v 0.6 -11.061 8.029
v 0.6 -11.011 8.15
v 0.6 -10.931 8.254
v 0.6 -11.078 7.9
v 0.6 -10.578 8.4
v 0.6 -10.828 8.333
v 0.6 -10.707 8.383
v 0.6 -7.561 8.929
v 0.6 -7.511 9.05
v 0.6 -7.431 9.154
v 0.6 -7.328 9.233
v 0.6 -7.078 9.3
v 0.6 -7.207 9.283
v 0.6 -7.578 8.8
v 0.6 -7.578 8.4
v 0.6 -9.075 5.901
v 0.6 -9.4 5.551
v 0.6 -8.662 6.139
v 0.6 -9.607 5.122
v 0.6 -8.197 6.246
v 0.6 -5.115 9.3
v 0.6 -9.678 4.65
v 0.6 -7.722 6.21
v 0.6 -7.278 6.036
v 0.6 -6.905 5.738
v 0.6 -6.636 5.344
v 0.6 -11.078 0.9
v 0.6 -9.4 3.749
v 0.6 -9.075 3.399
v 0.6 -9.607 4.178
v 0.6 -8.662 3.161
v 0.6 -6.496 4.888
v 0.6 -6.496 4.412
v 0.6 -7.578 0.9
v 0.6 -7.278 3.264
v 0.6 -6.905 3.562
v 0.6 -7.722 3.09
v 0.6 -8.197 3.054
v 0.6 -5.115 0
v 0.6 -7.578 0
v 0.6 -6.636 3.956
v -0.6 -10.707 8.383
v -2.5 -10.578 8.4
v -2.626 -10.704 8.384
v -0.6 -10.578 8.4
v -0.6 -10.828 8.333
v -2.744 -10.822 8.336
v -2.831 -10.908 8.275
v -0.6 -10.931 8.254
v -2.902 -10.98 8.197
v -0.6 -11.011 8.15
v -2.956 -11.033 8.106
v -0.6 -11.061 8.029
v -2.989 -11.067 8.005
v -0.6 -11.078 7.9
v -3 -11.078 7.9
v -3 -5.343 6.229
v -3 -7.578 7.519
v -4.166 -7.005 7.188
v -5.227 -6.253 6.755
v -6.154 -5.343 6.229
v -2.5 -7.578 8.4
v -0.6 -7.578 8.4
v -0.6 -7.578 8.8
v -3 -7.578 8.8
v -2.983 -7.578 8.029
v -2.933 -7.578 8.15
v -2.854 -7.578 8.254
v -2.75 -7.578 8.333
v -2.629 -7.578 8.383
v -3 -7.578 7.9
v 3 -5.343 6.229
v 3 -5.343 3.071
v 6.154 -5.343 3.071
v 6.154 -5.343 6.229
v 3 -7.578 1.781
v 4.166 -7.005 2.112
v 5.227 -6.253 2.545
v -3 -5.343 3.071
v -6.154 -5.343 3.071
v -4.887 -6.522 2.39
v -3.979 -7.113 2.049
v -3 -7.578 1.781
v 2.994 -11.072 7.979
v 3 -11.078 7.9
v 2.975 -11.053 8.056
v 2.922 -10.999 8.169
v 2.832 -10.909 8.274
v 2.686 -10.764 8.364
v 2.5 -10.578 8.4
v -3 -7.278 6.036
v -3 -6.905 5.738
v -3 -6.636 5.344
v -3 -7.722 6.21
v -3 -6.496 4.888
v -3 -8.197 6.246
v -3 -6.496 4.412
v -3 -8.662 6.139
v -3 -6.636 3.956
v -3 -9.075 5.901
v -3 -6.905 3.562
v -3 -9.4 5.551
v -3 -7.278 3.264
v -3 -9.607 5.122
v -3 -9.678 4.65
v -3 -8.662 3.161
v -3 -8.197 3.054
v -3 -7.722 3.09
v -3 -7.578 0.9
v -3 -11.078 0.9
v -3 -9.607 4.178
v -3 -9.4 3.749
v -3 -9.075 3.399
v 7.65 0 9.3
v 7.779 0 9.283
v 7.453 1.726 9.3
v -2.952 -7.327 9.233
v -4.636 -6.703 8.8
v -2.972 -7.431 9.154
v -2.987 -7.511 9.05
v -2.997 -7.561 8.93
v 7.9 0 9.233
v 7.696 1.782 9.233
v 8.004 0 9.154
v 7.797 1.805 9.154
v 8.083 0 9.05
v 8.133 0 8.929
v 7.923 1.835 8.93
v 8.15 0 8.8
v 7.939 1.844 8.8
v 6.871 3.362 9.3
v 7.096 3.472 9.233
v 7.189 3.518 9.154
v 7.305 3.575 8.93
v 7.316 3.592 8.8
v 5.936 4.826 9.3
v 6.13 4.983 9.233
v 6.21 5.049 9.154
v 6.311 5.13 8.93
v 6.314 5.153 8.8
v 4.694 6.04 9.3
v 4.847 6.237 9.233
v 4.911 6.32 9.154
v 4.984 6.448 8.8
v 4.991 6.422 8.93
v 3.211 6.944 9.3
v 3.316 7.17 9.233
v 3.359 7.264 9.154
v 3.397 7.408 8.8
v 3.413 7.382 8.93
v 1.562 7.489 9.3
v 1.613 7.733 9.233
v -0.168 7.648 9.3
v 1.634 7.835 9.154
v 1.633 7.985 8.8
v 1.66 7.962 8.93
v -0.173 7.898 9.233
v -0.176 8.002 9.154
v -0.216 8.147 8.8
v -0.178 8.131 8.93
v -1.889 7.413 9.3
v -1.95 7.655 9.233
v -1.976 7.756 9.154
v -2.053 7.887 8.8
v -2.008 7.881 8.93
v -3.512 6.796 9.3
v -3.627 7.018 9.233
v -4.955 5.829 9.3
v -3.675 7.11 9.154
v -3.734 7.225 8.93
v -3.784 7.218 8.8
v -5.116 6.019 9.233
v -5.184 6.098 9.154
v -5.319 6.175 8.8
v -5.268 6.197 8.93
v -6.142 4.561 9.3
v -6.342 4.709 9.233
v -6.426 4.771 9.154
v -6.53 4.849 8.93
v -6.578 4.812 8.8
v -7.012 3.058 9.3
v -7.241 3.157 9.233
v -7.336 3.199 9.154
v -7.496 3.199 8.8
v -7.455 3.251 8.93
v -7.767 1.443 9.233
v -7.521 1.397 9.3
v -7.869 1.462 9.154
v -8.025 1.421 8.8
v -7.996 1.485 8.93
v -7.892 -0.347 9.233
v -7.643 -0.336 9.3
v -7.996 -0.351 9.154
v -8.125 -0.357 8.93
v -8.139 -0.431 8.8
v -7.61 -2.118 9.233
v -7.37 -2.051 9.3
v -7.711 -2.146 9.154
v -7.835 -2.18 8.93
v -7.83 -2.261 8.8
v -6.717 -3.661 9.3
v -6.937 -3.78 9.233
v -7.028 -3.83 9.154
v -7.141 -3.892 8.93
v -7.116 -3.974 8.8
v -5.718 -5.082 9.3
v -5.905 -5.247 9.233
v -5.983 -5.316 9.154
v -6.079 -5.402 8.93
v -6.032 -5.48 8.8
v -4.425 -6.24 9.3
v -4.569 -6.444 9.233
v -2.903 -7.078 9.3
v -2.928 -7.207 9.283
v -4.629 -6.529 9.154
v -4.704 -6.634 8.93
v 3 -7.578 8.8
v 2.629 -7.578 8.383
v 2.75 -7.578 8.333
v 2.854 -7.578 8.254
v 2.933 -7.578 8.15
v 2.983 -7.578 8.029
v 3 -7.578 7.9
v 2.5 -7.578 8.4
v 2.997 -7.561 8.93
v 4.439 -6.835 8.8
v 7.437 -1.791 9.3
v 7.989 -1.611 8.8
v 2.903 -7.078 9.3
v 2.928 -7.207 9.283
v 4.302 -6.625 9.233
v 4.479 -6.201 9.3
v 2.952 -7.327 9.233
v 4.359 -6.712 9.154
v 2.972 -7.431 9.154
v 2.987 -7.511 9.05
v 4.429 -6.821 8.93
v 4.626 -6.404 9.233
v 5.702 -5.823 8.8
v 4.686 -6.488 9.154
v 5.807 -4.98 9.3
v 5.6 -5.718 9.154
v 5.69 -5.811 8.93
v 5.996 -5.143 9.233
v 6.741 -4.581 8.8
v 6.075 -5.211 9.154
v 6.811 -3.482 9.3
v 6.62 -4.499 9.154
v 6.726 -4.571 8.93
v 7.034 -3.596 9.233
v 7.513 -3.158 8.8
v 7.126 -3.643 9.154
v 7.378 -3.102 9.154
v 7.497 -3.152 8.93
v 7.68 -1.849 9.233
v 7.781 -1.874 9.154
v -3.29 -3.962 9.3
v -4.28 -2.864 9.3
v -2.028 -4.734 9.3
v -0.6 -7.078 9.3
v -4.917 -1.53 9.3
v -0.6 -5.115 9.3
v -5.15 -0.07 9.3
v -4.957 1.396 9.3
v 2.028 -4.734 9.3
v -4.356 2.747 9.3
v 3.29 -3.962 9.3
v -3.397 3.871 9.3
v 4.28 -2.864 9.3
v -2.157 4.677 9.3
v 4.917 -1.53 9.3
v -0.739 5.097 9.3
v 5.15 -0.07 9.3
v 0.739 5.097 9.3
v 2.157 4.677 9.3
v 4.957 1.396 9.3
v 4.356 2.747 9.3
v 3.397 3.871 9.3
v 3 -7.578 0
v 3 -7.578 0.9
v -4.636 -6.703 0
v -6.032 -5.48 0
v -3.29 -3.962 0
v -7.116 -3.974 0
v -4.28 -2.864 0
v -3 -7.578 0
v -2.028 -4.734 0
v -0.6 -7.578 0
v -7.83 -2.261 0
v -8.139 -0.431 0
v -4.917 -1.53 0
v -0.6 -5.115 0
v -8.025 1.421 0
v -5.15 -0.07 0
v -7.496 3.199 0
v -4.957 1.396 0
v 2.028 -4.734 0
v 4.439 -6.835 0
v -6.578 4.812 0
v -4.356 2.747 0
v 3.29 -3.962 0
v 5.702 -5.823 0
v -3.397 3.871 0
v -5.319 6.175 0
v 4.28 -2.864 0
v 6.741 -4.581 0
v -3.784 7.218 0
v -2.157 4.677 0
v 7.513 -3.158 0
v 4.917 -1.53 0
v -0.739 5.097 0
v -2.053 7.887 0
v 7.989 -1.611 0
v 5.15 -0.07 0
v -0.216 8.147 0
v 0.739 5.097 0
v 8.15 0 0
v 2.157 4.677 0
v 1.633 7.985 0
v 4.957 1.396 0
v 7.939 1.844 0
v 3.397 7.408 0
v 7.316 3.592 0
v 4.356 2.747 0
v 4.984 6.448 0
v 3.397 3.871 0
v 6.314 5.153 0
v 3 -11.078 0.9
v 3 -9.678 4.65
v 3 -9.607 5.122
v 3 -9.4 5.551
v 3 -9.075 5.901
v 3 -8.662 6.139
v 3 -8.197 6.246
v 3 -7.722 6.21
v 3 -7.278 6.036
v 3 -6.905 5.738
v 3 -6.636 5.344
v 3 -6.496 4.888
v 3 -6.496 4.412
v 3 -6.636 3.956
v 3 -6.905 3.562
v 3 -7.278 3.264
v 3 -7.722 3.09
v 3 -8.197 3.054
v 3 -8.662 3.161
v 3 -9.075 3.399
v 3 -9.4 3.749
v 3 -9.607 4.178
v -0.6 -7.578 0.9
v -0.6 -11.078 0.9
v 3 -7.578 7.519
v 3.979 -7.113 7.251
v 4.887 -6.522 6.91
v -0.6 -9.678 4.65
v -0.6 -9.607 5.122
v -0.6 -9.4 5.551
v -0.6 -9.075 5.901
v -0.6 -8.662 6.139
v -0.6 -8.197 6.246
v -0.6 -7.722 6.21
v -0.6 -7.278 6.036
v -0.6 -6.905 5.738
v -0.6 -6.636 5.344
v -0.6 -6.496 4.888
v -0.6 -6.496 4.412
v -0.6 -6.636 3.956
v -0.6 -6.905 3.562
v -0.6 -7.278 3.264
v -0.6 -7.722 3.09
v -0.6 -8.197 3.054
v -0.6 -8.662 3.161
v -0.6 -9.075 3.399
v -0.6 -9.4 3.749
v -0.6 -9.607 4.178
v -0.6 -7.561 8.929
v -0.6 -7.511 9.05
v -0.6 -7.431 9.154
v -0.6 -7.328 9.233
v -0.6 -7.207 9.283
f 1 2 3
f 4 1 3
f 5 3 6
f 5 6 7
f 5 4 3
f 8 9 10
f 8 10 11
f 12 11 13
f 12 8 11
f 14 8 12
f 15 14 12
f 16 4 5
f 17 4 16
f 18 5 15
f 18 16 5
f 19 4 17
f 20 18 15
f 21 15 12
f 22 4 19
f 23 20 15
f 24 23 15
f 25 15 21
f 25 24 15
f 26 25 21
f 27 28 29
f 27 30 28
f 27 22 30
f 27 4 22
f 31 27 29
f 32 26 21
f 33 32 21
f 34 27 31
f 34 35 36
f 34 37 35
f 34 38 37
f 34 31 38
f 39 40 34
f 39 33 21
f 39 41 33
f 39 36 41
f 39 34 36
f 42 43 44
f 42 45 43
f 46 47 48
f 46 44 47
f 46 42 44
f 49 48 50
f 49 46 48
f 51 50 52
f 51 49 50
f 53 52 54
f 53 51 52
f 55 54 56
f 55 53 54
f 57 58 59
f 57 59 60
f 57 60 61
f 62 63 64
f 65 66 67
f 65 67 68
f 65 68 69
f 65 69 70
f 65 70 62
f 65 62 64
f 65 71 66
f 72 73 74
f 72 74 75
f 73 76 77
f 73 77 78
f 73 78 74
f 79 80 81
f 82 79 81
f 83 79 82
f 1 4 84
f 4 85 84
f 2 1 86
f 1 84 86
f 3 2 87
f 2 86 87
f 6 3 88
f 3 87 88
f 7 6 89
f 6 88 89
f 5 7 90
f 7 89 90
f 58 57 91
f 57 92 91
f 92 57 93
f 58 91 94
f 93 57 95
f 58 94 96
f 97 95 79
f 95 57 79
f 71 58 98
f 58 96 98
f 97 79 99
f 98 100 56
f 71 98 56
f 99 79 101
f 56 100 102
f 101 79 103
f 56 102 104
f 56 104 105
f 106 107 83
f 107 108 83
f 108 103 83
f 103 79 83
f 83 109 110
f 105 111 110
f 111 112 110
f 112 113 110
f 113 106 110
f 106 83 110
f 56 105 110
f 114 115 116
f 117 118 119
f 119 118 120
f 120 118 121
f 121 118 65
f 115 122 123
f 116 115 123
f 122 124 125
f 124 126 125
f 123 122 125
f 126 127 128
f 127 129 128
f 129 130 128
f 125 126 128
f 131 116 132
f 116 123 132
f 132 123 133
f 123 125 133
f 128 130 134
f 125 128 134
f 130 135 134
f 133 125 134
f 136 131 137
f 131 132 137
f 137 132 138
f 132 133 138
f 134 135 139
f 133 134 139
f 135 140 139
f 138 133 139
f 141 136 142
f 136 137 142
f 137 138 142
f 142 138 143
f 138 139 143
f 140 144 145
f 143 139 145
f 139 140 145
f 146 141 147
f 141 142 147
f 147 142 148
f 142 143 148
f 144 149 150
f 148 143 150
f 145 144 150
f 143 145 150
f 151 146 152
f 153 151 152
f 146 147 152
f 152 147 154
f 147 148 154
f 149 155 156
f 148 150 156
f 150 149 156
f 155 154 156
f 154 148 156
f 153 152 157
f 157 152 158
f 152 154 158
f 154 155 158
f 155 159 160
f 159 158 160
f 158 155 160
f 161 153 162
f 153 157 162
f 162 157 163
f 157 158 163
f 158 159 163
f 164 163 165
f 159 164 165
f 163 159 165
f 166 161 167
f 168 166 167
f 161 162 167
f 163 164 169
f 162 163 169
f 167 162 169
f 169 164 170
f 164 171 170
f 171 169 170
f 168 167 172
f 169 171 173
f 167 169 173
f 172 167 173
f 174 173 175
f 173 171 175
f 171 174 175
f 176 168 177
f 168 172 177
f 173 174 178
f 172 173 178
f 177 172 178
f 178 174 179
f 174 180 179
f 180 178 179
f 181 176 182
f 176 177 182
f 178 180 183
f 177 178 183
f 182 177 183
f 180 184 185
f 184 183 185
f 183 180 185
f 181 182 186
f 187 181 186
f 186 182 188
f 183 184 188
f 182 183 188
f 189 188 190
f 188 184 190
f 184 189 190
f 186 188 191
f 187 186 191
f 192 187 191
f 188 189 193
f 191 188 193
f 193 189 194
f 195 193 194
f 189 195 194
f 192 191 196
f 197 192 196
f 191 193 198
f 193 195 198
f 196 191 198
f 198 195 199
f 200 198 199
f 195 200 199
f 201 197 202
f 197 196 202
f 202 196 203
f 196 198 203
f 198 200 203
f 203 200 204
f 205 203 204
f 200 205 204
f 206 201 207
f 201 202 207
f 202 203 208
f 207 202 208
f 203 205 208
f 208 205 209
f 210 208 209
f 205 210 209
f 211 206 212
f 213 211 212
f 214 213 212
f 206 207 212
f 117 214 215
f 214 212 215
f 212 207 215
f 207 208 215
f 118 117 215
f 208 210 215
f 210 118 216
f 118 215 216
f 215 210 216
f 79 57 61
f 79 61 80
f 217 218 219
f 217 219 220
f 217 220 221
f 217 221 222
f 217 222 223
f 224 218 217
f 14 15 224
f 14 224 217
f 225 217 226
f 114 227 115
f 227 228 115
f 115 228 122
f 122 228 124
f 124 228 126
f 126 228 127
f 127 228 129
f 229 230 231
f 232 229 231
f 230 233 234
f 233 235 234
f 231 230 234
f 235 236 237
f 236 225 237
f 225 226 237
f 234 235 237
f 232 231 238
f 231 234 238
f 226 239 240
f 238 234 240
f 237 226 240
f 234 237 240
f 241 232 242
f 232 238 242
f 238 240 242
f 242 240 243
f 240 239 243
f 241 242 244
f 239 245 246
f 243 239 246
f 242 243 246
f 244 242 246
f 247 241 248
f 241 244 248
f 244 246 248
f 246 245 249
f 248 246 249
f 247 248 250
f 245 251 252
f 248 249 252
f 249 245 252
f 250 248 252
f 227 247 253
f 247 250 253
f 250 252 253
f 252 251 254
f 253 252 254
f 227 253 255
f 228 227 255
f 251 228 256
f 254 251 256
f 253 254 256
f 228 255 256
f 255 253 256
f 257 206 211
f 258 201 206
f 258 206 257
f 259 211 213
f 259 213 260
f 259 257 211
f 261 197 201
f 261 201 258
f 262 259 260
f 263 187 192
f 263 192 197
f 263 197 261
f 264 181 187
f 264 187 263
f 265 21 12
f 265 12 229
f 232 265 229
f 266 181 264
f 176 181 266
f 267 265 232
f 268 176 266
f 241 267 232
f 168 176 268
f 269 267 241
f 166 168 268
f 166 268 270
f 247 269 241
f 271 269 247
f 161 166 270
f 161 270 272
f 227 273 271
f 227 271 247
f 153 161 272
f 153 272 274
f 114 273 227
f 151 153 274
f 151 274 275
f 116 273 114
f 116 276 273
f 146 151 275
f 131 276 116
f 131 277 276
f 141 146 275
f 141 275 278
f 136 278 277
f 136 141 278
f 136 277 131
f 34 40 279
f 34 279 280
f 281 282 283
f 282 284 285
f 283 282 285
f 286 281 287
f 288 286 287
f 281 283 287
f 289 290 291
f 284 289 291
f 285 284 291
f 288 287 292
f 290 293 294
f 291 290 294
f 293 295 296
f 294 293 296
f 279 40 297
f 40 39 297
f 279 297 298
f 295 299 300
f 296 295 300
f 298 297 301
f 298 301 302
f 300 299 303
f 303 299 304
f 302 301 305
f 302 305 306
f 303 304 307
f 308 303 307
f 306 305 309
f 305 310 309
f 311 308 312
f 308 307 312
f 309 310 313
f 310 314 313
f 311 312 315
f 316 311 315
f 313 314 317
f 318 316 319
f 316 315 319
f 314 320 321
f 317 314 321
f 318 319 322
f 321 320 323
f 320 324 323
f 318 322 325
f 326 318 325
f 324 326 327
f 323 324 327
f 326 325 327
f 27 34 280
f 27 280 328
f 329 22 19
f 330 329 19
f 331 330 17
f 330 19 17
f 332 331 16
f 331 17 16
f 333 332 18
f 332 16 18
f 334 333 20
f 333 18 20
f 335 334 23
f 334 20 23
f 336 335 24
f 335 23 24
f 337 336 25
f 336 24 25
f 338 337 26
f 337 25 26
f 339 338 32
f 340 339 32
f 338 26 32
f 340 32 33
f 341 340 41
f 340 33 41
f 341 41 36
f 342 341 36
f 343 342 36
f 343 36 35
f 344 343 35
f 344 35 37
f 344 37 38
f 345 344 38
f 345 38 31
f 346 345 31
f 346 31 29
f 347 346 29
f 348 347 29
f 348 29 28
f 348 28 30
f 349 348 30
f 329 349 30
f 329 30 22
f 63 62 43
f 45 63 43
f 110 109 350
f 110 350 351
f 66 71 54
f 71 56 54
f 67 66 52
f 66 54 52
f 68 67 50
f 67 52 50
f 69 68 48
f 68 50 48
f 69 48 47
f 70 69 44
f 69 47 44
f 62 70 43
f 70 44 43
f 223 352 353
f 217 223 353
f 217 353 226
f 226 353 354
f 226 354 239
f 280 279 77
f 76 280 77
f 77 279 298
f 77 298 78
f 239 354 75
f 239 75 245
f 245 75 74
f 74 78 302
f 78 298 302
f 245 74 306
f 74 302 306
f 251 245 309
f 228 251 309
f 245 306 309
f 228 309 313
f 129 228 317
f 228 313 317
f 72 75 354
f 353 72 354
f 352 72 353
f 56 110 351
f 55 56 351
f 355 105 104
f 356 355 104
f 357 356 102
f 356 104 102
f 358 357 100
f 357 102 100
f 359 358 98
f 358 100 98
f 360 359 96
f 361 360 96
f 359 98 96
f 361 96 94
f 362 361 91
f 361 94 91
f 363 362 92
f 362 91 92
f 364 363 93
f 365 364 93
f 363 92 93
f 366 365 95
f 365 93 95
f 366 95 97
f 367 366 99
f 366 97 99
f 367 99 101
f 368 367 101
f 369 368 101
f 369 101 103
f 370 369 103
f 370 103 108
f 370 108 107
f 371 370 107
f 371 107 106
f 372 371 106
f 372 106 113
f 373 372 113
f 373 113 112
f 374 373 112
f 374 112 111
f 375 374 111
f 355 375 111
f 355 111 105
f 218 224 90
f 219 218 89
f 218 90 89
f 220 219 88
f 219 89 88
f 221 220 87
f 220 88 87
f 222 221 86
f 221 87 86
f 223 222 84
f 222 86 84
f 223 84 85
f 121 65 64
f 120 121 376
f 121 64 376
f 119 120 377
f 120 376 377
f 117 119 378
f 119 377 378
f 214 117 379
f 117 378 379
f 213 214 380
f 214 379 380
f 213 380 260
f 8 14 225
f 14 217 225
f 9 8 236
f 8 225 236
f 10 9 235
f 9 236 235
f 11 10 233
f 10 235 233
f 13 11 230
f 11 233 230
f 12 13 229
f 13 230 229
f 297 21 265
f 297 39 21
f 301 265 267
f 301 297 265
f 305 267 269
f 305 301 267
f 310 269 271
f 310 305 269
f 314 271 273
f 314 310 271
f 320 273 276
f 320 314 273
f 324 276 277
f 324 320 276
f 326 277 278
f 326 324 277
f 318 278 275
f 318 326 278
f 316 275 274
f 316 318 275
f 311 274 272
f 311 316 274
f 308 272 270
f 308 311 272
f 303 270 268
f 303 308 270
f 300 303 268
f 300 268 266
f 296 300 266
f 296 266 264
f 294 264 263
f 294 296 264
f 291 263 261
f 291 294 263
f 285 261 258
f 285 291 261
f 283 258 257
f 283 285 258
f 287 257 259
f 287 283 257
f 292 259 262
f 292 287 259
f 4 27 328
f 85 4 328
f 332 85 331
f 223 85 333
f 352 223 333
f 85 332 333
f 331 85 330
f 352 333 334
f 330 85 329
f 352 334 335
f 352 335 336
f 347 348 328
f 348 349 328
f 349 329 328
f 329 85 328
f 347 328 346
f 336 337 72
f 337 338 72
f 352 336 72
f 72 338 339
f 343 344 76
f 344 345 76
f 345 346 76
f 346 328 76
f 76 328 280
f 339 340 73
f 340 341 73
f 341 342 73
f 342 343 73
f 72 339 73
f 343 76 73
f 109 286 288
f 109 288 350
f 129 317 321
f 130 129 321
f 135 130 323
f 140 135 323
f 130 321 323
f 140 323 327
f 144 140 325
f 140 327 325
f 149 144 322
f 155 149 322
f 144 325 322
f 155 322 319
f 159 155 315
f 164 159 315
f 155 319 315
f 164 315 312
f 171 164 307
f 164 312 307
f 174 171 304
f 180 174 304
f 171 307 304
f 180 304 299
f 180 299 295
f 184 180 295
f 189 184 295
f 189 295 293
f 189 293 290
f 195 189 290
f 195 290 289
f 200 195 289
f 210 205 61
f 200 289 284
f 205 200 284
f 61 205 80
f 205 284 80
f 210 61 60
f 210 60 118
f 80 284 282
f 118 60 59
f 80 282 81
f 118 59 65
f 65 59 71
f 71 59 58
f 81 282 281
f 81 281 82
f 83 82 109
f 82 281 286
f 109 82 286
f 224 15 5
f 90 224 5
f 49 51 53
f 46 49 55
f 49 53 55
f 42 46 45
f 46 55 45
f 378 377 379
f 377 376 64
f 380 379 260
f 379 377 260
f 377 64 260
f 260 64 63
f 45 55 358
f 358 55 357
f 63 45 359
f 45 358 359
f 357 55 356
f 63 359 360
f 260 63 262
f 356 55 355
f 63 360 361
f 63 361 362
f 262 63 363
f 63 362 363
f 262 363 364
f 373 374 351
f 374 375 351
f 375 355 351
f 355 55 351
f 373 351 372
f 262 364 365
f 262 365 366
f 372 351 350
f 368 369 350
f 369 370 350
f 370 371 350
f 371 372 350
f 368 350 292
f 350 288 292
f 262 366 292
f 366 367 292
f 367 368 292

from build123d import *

# Parameters (mm, degrees)
F0_R      = 5.15
F1_DEPTH  = 9.3
F2_W      = 1.2
F2_H      = 13.8570601121
F3_DEPTH  = 9.301
F4_W      = 3.5
F4_H      = 0.9
F5_DEPTH  = 25
F7_R      = 1.6
F8_DEPTH  = 21.151
F10_DEPTH = 25
F12_DEPTH = 25
F13_R     = 0.5


with BuildPart() as f1:
    # F0 (on Top) → F1 (new body)
    with BuildSketch(Plane.XY):
        with BuildLine():
            ThreePointArc((3, -7.5777635223), (6.7406416609, -4.5810752013), (8.15, 0))
            ThreePointArc((8.15, 0), (-4.5810752013, 6.7406416609), (-3, -7.5777635223))
            Line((-3, -7.5777635223), (3, -7.5777635223))
        make_face()
        Circle(F0_R, mode=Mode.SUBTRACT)
        with BuildLine():
            Line((3, -7.5777635223), (-3, -7.5777635223))
            ThreePointArc((-3, -7.5777635223), (0, -8.15), (3, -7.5777635223))
        make_face()
        with BuildLine():
            ThreePointArc((3, -7.5777635223), (0, -8.15), (-3, -7.5777635223))
            Line((-3, -7.5777635223), (-3, -11.0777635223))
            Line((-3, -11.0777635223), (3, -11.0777635223))
            Line((3, -11.0777635223), (3, -7.5777635223))
        make_face()
    extrude(amount=F1_DEPTH)

    # F2 (on Top) → F3 (cut, through all)
    with BuildSketch(Plane.XY):
        with Locations((0, -6.928530056)):
            Rectangle(F2_W, F2_H)
    extrude(amount=F3_DEPTH, mode=Mode.SUBTRACT)

    # F4 (on face) → F5 (cut)
    with BuildSketch(Plane(origin=(-3, 0, 0), x_dir=(0, -1, 0), z_dir=(-1, 0, 0))):
        with Locations((9.3277635223, 8.85)):
            Rectangle(F4_W, F4_H)
        with Locations((9.3277635223, 0.45)):
            Rectangle(F4_W, F4_H)
    extrude(amount=-F5_DEPTH, mode=Mode.SUBTRACT)

    # F7 (on offset) → F8 (cut, through all)
    with BuildSketch(Plane(origin=(-13, 0, 0), x_dir=(0, -1, 0), z_dir=(-1, 0, 0))):
        with Locations((8.0777635223, 4.65)):
            Circle(F7_R)
    extrude(amount=-F8_DEPTH, mode=Mode.SUBTRACT)

    # F9 (on face) → F10 (cut)
    with BuildSketch(Plane(origin=(-3, 0, 0), x_dir=(0, -1, 0), z_dir=(-1, 0, 0))):
        Polygon((10.8127635223, 6.2290529862), (8.0777635223, 7.8081059725), (5.3427635223, 6.2290529862), (5.3427635223, 3.0709470138), (8.0777635223, 1.4918940275), (10.8127635223, 3.0709470138), align=None)
    extrude(amount=F10_DEPTH, mode=Mode.SUBTRACT)

    # F11 (on face) → F12 (cut)
    with BuildSketch(Plane.YZ.offset(3)):
        Polygon((-5.3427635223, 3.0709470138), (-5.3427635223, 6.2290529862), (-8.0777635223, 7.8081059725), (-10.8127635223, 6.2290529862), (-10.8127635223, 3.0709470138), (-8.0777635223, 1.4918940275), align=None)
    extrude(amount=F12_DEPTH, mode=Mode.SUBTRACT)

    # F13
    f13_edges = [f1.edges().sort_by_distance(p)[0] for p in [
        (0, 8.15, 9.3),
        (3, -9.327764, 8.4),
        (-3, -9.327764, 8.4),
        (-1.8, -7.577764, 9.3),
        (1.8, -7.577764, 9.3),
        (1.8, -11.077764, 8.4),
        (-1.8, -11.077764, 8.4),
    ]]
    fillet(f13_edges, radius=F13_R)


solid = f1.part
